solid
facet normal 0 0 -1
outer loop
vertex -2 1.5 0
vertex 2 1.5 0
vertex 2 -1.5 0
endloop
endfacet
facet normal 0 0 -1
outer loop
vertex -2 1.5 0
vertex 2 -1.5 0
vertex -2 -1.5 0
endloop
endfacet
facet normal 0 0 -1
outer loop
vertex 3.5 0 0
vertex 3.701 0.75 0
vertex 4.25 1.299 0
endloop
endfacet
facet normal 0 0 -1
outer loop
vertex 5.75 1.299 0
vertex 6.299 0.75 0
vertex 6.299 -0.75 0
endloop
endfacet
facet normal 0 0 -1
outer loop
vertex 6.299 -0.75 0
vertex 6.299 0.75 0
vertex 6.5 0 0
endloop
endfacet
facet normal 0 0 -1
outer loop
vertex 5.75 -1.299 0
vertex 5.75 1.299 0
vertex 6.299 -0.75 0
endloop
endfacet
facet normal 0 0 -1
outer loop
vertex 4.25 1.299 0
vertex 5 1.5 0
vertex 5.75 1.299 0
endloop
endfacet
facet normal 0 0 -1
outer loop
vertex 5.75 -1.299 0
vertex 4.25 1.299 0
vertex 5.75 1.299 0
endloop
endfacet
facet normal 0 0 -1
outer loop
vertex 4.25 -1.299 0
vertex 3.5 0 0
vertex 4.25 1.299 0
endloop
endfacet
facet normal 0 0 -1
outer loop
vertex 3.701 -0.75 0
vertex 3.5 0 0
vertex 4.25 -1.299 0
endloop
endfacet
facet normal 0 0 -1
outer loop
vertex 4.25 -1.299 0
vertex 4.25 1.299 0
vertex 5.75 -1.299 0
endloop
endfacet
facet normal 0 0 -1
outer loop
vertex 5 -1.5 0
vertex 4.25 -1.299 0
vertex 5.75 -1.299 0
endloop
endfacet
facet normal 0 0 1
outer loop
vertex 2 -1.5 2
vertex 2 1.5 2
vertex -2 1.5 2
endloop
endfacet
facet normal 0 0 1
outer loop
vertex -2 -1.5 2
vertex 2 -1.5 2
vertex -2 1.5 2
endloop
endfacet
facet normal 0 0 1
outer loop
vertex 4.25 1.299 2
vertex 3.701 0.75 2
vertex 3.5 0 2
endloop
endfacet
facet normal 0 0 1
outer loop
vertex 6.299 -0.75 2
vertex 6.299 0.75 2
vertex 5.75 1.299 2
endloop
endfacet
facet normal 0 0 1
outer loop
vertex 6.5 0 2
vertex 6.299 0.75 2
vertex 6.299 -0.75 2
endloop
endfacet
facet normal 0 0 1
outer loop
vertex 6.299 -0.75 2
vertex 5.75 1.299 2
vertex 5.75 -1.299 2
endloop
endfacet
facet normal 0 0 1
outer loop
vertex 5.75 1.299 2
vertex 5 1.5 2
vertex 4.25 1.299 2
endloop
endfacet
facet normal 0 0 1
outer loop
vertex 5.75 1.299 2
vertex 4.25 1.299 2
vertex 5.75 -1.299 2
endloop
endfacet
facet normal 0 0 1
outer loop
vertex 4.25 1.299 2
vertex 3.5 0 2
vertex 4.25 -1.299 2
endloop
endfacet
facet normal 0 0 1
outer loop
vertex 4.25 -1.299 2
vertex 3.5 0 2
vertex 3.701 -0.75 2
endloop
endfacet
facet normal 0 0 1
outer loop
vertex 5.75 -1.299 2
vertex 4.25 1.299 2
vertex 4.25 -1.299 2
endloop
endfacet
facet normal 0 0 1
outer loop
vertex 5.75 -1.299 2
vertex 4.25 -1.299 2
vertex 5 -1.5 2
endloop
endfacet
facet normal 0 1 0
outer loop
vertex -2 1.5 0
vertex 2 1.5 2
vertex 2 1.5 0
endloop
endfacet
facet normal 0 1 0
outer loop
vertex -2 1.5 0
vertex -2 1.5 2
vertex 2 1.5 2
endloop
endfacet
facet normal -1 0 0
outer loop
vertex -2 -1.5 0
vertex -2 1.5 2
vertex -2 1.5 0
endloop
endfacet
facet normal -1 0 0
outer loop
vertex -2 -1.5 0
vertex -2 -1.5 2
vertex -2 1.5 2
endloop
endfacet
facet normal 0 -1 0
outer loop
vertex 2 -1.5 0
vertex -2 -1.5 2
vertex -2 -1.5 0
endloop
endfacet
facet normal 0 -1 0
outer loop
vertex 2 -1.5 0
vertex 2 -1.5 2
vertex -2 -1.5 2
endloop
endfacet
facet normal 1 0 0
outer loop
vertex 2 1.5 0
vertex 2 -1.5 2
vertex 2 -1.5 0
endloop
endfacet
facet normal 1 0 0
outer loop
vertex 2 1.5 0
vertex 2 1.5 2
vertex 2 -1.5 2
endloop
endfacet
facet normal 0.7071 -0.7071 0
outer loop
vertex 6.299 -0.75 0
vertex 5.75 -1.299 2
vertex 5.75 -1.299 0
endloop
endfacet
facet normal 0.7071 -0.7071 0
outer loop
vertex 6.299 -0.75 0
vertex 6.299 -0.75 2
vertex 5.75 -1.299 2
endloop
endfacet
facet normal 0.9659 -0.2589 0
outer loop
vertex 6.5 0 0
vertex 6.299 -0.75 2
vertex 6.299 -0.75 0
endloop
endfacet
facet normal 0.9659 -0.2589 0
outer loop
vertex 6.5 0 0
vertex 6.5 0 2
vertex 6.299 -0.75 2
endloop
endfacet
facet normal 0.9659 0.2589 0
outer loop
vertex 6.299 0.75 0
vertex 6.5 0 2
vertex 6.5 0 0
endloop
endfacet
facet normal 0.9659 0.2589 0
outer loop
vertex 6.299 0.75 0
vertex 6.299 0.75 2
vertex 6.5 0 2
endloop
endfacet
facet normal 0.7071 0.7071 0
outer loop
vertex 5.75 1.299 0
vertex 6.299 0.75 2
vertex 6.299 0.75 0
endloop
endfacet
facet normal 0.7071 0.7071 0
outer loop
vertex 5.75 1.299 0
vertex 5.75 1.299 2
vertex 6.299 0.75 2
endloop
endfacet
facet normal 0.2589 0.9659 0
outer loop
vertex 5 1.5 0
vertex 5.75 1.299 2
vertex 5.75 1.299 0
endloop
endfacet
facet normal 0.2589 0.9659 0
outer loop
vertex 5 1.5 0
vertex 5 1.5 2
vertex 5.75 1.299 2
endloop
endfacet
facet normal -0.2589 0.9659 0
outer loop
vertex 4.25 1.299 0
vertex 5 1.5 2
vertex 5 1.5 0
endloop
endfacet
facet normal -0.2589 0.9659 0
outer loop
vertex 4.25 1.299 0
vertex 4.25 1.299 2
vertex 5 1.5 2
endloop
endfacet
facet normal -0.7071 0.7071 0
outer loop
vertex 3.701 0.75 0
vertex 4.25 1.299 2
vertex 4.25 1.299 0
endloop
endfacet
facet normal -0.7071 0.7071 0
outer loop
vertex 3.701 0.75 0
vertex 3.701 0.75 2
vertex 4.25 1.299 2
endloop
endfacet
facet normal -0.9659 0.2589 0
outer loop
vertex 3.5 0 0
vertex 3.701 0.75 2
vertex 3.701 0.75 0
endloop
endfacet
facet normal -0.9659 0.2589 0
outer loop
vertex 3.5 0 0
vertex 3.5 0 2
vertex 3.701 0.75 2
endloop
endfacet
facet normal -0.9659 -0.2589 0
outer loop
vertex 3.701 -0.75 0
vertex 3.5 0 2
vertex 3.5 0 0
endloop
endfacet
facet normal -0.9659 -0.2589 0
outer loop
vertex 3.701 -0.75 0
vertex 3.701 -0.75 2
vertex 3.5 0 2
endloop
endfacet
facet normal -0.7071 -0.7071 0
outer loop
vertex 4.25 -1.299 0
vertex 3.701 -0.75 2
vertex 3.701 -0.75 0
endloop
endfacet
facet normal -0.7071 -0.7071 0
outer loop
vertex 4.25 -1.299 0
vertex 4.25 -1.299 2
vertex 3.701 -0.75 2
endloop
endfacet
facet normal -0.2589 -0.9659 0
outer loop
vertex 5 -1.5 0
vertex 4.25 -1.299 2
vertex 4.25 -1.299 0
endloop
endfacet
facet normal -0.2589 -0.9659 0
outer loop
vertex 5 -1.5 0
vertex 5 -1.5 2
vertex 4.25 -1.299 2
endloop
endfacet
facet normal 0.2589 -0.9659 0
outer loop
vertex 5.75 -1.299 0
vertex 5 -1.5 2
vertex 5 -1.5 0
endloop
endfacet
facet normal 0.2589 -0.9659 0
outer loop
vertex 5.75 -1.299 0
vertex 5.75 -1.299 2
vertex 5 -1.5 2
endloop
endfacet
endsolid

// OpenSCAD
// 2D primitives side by side
linear_extrude(2) {
  square([4, 3], center = true);
  translate([5, 0]) circle(1.5, $fn = 12);
}
